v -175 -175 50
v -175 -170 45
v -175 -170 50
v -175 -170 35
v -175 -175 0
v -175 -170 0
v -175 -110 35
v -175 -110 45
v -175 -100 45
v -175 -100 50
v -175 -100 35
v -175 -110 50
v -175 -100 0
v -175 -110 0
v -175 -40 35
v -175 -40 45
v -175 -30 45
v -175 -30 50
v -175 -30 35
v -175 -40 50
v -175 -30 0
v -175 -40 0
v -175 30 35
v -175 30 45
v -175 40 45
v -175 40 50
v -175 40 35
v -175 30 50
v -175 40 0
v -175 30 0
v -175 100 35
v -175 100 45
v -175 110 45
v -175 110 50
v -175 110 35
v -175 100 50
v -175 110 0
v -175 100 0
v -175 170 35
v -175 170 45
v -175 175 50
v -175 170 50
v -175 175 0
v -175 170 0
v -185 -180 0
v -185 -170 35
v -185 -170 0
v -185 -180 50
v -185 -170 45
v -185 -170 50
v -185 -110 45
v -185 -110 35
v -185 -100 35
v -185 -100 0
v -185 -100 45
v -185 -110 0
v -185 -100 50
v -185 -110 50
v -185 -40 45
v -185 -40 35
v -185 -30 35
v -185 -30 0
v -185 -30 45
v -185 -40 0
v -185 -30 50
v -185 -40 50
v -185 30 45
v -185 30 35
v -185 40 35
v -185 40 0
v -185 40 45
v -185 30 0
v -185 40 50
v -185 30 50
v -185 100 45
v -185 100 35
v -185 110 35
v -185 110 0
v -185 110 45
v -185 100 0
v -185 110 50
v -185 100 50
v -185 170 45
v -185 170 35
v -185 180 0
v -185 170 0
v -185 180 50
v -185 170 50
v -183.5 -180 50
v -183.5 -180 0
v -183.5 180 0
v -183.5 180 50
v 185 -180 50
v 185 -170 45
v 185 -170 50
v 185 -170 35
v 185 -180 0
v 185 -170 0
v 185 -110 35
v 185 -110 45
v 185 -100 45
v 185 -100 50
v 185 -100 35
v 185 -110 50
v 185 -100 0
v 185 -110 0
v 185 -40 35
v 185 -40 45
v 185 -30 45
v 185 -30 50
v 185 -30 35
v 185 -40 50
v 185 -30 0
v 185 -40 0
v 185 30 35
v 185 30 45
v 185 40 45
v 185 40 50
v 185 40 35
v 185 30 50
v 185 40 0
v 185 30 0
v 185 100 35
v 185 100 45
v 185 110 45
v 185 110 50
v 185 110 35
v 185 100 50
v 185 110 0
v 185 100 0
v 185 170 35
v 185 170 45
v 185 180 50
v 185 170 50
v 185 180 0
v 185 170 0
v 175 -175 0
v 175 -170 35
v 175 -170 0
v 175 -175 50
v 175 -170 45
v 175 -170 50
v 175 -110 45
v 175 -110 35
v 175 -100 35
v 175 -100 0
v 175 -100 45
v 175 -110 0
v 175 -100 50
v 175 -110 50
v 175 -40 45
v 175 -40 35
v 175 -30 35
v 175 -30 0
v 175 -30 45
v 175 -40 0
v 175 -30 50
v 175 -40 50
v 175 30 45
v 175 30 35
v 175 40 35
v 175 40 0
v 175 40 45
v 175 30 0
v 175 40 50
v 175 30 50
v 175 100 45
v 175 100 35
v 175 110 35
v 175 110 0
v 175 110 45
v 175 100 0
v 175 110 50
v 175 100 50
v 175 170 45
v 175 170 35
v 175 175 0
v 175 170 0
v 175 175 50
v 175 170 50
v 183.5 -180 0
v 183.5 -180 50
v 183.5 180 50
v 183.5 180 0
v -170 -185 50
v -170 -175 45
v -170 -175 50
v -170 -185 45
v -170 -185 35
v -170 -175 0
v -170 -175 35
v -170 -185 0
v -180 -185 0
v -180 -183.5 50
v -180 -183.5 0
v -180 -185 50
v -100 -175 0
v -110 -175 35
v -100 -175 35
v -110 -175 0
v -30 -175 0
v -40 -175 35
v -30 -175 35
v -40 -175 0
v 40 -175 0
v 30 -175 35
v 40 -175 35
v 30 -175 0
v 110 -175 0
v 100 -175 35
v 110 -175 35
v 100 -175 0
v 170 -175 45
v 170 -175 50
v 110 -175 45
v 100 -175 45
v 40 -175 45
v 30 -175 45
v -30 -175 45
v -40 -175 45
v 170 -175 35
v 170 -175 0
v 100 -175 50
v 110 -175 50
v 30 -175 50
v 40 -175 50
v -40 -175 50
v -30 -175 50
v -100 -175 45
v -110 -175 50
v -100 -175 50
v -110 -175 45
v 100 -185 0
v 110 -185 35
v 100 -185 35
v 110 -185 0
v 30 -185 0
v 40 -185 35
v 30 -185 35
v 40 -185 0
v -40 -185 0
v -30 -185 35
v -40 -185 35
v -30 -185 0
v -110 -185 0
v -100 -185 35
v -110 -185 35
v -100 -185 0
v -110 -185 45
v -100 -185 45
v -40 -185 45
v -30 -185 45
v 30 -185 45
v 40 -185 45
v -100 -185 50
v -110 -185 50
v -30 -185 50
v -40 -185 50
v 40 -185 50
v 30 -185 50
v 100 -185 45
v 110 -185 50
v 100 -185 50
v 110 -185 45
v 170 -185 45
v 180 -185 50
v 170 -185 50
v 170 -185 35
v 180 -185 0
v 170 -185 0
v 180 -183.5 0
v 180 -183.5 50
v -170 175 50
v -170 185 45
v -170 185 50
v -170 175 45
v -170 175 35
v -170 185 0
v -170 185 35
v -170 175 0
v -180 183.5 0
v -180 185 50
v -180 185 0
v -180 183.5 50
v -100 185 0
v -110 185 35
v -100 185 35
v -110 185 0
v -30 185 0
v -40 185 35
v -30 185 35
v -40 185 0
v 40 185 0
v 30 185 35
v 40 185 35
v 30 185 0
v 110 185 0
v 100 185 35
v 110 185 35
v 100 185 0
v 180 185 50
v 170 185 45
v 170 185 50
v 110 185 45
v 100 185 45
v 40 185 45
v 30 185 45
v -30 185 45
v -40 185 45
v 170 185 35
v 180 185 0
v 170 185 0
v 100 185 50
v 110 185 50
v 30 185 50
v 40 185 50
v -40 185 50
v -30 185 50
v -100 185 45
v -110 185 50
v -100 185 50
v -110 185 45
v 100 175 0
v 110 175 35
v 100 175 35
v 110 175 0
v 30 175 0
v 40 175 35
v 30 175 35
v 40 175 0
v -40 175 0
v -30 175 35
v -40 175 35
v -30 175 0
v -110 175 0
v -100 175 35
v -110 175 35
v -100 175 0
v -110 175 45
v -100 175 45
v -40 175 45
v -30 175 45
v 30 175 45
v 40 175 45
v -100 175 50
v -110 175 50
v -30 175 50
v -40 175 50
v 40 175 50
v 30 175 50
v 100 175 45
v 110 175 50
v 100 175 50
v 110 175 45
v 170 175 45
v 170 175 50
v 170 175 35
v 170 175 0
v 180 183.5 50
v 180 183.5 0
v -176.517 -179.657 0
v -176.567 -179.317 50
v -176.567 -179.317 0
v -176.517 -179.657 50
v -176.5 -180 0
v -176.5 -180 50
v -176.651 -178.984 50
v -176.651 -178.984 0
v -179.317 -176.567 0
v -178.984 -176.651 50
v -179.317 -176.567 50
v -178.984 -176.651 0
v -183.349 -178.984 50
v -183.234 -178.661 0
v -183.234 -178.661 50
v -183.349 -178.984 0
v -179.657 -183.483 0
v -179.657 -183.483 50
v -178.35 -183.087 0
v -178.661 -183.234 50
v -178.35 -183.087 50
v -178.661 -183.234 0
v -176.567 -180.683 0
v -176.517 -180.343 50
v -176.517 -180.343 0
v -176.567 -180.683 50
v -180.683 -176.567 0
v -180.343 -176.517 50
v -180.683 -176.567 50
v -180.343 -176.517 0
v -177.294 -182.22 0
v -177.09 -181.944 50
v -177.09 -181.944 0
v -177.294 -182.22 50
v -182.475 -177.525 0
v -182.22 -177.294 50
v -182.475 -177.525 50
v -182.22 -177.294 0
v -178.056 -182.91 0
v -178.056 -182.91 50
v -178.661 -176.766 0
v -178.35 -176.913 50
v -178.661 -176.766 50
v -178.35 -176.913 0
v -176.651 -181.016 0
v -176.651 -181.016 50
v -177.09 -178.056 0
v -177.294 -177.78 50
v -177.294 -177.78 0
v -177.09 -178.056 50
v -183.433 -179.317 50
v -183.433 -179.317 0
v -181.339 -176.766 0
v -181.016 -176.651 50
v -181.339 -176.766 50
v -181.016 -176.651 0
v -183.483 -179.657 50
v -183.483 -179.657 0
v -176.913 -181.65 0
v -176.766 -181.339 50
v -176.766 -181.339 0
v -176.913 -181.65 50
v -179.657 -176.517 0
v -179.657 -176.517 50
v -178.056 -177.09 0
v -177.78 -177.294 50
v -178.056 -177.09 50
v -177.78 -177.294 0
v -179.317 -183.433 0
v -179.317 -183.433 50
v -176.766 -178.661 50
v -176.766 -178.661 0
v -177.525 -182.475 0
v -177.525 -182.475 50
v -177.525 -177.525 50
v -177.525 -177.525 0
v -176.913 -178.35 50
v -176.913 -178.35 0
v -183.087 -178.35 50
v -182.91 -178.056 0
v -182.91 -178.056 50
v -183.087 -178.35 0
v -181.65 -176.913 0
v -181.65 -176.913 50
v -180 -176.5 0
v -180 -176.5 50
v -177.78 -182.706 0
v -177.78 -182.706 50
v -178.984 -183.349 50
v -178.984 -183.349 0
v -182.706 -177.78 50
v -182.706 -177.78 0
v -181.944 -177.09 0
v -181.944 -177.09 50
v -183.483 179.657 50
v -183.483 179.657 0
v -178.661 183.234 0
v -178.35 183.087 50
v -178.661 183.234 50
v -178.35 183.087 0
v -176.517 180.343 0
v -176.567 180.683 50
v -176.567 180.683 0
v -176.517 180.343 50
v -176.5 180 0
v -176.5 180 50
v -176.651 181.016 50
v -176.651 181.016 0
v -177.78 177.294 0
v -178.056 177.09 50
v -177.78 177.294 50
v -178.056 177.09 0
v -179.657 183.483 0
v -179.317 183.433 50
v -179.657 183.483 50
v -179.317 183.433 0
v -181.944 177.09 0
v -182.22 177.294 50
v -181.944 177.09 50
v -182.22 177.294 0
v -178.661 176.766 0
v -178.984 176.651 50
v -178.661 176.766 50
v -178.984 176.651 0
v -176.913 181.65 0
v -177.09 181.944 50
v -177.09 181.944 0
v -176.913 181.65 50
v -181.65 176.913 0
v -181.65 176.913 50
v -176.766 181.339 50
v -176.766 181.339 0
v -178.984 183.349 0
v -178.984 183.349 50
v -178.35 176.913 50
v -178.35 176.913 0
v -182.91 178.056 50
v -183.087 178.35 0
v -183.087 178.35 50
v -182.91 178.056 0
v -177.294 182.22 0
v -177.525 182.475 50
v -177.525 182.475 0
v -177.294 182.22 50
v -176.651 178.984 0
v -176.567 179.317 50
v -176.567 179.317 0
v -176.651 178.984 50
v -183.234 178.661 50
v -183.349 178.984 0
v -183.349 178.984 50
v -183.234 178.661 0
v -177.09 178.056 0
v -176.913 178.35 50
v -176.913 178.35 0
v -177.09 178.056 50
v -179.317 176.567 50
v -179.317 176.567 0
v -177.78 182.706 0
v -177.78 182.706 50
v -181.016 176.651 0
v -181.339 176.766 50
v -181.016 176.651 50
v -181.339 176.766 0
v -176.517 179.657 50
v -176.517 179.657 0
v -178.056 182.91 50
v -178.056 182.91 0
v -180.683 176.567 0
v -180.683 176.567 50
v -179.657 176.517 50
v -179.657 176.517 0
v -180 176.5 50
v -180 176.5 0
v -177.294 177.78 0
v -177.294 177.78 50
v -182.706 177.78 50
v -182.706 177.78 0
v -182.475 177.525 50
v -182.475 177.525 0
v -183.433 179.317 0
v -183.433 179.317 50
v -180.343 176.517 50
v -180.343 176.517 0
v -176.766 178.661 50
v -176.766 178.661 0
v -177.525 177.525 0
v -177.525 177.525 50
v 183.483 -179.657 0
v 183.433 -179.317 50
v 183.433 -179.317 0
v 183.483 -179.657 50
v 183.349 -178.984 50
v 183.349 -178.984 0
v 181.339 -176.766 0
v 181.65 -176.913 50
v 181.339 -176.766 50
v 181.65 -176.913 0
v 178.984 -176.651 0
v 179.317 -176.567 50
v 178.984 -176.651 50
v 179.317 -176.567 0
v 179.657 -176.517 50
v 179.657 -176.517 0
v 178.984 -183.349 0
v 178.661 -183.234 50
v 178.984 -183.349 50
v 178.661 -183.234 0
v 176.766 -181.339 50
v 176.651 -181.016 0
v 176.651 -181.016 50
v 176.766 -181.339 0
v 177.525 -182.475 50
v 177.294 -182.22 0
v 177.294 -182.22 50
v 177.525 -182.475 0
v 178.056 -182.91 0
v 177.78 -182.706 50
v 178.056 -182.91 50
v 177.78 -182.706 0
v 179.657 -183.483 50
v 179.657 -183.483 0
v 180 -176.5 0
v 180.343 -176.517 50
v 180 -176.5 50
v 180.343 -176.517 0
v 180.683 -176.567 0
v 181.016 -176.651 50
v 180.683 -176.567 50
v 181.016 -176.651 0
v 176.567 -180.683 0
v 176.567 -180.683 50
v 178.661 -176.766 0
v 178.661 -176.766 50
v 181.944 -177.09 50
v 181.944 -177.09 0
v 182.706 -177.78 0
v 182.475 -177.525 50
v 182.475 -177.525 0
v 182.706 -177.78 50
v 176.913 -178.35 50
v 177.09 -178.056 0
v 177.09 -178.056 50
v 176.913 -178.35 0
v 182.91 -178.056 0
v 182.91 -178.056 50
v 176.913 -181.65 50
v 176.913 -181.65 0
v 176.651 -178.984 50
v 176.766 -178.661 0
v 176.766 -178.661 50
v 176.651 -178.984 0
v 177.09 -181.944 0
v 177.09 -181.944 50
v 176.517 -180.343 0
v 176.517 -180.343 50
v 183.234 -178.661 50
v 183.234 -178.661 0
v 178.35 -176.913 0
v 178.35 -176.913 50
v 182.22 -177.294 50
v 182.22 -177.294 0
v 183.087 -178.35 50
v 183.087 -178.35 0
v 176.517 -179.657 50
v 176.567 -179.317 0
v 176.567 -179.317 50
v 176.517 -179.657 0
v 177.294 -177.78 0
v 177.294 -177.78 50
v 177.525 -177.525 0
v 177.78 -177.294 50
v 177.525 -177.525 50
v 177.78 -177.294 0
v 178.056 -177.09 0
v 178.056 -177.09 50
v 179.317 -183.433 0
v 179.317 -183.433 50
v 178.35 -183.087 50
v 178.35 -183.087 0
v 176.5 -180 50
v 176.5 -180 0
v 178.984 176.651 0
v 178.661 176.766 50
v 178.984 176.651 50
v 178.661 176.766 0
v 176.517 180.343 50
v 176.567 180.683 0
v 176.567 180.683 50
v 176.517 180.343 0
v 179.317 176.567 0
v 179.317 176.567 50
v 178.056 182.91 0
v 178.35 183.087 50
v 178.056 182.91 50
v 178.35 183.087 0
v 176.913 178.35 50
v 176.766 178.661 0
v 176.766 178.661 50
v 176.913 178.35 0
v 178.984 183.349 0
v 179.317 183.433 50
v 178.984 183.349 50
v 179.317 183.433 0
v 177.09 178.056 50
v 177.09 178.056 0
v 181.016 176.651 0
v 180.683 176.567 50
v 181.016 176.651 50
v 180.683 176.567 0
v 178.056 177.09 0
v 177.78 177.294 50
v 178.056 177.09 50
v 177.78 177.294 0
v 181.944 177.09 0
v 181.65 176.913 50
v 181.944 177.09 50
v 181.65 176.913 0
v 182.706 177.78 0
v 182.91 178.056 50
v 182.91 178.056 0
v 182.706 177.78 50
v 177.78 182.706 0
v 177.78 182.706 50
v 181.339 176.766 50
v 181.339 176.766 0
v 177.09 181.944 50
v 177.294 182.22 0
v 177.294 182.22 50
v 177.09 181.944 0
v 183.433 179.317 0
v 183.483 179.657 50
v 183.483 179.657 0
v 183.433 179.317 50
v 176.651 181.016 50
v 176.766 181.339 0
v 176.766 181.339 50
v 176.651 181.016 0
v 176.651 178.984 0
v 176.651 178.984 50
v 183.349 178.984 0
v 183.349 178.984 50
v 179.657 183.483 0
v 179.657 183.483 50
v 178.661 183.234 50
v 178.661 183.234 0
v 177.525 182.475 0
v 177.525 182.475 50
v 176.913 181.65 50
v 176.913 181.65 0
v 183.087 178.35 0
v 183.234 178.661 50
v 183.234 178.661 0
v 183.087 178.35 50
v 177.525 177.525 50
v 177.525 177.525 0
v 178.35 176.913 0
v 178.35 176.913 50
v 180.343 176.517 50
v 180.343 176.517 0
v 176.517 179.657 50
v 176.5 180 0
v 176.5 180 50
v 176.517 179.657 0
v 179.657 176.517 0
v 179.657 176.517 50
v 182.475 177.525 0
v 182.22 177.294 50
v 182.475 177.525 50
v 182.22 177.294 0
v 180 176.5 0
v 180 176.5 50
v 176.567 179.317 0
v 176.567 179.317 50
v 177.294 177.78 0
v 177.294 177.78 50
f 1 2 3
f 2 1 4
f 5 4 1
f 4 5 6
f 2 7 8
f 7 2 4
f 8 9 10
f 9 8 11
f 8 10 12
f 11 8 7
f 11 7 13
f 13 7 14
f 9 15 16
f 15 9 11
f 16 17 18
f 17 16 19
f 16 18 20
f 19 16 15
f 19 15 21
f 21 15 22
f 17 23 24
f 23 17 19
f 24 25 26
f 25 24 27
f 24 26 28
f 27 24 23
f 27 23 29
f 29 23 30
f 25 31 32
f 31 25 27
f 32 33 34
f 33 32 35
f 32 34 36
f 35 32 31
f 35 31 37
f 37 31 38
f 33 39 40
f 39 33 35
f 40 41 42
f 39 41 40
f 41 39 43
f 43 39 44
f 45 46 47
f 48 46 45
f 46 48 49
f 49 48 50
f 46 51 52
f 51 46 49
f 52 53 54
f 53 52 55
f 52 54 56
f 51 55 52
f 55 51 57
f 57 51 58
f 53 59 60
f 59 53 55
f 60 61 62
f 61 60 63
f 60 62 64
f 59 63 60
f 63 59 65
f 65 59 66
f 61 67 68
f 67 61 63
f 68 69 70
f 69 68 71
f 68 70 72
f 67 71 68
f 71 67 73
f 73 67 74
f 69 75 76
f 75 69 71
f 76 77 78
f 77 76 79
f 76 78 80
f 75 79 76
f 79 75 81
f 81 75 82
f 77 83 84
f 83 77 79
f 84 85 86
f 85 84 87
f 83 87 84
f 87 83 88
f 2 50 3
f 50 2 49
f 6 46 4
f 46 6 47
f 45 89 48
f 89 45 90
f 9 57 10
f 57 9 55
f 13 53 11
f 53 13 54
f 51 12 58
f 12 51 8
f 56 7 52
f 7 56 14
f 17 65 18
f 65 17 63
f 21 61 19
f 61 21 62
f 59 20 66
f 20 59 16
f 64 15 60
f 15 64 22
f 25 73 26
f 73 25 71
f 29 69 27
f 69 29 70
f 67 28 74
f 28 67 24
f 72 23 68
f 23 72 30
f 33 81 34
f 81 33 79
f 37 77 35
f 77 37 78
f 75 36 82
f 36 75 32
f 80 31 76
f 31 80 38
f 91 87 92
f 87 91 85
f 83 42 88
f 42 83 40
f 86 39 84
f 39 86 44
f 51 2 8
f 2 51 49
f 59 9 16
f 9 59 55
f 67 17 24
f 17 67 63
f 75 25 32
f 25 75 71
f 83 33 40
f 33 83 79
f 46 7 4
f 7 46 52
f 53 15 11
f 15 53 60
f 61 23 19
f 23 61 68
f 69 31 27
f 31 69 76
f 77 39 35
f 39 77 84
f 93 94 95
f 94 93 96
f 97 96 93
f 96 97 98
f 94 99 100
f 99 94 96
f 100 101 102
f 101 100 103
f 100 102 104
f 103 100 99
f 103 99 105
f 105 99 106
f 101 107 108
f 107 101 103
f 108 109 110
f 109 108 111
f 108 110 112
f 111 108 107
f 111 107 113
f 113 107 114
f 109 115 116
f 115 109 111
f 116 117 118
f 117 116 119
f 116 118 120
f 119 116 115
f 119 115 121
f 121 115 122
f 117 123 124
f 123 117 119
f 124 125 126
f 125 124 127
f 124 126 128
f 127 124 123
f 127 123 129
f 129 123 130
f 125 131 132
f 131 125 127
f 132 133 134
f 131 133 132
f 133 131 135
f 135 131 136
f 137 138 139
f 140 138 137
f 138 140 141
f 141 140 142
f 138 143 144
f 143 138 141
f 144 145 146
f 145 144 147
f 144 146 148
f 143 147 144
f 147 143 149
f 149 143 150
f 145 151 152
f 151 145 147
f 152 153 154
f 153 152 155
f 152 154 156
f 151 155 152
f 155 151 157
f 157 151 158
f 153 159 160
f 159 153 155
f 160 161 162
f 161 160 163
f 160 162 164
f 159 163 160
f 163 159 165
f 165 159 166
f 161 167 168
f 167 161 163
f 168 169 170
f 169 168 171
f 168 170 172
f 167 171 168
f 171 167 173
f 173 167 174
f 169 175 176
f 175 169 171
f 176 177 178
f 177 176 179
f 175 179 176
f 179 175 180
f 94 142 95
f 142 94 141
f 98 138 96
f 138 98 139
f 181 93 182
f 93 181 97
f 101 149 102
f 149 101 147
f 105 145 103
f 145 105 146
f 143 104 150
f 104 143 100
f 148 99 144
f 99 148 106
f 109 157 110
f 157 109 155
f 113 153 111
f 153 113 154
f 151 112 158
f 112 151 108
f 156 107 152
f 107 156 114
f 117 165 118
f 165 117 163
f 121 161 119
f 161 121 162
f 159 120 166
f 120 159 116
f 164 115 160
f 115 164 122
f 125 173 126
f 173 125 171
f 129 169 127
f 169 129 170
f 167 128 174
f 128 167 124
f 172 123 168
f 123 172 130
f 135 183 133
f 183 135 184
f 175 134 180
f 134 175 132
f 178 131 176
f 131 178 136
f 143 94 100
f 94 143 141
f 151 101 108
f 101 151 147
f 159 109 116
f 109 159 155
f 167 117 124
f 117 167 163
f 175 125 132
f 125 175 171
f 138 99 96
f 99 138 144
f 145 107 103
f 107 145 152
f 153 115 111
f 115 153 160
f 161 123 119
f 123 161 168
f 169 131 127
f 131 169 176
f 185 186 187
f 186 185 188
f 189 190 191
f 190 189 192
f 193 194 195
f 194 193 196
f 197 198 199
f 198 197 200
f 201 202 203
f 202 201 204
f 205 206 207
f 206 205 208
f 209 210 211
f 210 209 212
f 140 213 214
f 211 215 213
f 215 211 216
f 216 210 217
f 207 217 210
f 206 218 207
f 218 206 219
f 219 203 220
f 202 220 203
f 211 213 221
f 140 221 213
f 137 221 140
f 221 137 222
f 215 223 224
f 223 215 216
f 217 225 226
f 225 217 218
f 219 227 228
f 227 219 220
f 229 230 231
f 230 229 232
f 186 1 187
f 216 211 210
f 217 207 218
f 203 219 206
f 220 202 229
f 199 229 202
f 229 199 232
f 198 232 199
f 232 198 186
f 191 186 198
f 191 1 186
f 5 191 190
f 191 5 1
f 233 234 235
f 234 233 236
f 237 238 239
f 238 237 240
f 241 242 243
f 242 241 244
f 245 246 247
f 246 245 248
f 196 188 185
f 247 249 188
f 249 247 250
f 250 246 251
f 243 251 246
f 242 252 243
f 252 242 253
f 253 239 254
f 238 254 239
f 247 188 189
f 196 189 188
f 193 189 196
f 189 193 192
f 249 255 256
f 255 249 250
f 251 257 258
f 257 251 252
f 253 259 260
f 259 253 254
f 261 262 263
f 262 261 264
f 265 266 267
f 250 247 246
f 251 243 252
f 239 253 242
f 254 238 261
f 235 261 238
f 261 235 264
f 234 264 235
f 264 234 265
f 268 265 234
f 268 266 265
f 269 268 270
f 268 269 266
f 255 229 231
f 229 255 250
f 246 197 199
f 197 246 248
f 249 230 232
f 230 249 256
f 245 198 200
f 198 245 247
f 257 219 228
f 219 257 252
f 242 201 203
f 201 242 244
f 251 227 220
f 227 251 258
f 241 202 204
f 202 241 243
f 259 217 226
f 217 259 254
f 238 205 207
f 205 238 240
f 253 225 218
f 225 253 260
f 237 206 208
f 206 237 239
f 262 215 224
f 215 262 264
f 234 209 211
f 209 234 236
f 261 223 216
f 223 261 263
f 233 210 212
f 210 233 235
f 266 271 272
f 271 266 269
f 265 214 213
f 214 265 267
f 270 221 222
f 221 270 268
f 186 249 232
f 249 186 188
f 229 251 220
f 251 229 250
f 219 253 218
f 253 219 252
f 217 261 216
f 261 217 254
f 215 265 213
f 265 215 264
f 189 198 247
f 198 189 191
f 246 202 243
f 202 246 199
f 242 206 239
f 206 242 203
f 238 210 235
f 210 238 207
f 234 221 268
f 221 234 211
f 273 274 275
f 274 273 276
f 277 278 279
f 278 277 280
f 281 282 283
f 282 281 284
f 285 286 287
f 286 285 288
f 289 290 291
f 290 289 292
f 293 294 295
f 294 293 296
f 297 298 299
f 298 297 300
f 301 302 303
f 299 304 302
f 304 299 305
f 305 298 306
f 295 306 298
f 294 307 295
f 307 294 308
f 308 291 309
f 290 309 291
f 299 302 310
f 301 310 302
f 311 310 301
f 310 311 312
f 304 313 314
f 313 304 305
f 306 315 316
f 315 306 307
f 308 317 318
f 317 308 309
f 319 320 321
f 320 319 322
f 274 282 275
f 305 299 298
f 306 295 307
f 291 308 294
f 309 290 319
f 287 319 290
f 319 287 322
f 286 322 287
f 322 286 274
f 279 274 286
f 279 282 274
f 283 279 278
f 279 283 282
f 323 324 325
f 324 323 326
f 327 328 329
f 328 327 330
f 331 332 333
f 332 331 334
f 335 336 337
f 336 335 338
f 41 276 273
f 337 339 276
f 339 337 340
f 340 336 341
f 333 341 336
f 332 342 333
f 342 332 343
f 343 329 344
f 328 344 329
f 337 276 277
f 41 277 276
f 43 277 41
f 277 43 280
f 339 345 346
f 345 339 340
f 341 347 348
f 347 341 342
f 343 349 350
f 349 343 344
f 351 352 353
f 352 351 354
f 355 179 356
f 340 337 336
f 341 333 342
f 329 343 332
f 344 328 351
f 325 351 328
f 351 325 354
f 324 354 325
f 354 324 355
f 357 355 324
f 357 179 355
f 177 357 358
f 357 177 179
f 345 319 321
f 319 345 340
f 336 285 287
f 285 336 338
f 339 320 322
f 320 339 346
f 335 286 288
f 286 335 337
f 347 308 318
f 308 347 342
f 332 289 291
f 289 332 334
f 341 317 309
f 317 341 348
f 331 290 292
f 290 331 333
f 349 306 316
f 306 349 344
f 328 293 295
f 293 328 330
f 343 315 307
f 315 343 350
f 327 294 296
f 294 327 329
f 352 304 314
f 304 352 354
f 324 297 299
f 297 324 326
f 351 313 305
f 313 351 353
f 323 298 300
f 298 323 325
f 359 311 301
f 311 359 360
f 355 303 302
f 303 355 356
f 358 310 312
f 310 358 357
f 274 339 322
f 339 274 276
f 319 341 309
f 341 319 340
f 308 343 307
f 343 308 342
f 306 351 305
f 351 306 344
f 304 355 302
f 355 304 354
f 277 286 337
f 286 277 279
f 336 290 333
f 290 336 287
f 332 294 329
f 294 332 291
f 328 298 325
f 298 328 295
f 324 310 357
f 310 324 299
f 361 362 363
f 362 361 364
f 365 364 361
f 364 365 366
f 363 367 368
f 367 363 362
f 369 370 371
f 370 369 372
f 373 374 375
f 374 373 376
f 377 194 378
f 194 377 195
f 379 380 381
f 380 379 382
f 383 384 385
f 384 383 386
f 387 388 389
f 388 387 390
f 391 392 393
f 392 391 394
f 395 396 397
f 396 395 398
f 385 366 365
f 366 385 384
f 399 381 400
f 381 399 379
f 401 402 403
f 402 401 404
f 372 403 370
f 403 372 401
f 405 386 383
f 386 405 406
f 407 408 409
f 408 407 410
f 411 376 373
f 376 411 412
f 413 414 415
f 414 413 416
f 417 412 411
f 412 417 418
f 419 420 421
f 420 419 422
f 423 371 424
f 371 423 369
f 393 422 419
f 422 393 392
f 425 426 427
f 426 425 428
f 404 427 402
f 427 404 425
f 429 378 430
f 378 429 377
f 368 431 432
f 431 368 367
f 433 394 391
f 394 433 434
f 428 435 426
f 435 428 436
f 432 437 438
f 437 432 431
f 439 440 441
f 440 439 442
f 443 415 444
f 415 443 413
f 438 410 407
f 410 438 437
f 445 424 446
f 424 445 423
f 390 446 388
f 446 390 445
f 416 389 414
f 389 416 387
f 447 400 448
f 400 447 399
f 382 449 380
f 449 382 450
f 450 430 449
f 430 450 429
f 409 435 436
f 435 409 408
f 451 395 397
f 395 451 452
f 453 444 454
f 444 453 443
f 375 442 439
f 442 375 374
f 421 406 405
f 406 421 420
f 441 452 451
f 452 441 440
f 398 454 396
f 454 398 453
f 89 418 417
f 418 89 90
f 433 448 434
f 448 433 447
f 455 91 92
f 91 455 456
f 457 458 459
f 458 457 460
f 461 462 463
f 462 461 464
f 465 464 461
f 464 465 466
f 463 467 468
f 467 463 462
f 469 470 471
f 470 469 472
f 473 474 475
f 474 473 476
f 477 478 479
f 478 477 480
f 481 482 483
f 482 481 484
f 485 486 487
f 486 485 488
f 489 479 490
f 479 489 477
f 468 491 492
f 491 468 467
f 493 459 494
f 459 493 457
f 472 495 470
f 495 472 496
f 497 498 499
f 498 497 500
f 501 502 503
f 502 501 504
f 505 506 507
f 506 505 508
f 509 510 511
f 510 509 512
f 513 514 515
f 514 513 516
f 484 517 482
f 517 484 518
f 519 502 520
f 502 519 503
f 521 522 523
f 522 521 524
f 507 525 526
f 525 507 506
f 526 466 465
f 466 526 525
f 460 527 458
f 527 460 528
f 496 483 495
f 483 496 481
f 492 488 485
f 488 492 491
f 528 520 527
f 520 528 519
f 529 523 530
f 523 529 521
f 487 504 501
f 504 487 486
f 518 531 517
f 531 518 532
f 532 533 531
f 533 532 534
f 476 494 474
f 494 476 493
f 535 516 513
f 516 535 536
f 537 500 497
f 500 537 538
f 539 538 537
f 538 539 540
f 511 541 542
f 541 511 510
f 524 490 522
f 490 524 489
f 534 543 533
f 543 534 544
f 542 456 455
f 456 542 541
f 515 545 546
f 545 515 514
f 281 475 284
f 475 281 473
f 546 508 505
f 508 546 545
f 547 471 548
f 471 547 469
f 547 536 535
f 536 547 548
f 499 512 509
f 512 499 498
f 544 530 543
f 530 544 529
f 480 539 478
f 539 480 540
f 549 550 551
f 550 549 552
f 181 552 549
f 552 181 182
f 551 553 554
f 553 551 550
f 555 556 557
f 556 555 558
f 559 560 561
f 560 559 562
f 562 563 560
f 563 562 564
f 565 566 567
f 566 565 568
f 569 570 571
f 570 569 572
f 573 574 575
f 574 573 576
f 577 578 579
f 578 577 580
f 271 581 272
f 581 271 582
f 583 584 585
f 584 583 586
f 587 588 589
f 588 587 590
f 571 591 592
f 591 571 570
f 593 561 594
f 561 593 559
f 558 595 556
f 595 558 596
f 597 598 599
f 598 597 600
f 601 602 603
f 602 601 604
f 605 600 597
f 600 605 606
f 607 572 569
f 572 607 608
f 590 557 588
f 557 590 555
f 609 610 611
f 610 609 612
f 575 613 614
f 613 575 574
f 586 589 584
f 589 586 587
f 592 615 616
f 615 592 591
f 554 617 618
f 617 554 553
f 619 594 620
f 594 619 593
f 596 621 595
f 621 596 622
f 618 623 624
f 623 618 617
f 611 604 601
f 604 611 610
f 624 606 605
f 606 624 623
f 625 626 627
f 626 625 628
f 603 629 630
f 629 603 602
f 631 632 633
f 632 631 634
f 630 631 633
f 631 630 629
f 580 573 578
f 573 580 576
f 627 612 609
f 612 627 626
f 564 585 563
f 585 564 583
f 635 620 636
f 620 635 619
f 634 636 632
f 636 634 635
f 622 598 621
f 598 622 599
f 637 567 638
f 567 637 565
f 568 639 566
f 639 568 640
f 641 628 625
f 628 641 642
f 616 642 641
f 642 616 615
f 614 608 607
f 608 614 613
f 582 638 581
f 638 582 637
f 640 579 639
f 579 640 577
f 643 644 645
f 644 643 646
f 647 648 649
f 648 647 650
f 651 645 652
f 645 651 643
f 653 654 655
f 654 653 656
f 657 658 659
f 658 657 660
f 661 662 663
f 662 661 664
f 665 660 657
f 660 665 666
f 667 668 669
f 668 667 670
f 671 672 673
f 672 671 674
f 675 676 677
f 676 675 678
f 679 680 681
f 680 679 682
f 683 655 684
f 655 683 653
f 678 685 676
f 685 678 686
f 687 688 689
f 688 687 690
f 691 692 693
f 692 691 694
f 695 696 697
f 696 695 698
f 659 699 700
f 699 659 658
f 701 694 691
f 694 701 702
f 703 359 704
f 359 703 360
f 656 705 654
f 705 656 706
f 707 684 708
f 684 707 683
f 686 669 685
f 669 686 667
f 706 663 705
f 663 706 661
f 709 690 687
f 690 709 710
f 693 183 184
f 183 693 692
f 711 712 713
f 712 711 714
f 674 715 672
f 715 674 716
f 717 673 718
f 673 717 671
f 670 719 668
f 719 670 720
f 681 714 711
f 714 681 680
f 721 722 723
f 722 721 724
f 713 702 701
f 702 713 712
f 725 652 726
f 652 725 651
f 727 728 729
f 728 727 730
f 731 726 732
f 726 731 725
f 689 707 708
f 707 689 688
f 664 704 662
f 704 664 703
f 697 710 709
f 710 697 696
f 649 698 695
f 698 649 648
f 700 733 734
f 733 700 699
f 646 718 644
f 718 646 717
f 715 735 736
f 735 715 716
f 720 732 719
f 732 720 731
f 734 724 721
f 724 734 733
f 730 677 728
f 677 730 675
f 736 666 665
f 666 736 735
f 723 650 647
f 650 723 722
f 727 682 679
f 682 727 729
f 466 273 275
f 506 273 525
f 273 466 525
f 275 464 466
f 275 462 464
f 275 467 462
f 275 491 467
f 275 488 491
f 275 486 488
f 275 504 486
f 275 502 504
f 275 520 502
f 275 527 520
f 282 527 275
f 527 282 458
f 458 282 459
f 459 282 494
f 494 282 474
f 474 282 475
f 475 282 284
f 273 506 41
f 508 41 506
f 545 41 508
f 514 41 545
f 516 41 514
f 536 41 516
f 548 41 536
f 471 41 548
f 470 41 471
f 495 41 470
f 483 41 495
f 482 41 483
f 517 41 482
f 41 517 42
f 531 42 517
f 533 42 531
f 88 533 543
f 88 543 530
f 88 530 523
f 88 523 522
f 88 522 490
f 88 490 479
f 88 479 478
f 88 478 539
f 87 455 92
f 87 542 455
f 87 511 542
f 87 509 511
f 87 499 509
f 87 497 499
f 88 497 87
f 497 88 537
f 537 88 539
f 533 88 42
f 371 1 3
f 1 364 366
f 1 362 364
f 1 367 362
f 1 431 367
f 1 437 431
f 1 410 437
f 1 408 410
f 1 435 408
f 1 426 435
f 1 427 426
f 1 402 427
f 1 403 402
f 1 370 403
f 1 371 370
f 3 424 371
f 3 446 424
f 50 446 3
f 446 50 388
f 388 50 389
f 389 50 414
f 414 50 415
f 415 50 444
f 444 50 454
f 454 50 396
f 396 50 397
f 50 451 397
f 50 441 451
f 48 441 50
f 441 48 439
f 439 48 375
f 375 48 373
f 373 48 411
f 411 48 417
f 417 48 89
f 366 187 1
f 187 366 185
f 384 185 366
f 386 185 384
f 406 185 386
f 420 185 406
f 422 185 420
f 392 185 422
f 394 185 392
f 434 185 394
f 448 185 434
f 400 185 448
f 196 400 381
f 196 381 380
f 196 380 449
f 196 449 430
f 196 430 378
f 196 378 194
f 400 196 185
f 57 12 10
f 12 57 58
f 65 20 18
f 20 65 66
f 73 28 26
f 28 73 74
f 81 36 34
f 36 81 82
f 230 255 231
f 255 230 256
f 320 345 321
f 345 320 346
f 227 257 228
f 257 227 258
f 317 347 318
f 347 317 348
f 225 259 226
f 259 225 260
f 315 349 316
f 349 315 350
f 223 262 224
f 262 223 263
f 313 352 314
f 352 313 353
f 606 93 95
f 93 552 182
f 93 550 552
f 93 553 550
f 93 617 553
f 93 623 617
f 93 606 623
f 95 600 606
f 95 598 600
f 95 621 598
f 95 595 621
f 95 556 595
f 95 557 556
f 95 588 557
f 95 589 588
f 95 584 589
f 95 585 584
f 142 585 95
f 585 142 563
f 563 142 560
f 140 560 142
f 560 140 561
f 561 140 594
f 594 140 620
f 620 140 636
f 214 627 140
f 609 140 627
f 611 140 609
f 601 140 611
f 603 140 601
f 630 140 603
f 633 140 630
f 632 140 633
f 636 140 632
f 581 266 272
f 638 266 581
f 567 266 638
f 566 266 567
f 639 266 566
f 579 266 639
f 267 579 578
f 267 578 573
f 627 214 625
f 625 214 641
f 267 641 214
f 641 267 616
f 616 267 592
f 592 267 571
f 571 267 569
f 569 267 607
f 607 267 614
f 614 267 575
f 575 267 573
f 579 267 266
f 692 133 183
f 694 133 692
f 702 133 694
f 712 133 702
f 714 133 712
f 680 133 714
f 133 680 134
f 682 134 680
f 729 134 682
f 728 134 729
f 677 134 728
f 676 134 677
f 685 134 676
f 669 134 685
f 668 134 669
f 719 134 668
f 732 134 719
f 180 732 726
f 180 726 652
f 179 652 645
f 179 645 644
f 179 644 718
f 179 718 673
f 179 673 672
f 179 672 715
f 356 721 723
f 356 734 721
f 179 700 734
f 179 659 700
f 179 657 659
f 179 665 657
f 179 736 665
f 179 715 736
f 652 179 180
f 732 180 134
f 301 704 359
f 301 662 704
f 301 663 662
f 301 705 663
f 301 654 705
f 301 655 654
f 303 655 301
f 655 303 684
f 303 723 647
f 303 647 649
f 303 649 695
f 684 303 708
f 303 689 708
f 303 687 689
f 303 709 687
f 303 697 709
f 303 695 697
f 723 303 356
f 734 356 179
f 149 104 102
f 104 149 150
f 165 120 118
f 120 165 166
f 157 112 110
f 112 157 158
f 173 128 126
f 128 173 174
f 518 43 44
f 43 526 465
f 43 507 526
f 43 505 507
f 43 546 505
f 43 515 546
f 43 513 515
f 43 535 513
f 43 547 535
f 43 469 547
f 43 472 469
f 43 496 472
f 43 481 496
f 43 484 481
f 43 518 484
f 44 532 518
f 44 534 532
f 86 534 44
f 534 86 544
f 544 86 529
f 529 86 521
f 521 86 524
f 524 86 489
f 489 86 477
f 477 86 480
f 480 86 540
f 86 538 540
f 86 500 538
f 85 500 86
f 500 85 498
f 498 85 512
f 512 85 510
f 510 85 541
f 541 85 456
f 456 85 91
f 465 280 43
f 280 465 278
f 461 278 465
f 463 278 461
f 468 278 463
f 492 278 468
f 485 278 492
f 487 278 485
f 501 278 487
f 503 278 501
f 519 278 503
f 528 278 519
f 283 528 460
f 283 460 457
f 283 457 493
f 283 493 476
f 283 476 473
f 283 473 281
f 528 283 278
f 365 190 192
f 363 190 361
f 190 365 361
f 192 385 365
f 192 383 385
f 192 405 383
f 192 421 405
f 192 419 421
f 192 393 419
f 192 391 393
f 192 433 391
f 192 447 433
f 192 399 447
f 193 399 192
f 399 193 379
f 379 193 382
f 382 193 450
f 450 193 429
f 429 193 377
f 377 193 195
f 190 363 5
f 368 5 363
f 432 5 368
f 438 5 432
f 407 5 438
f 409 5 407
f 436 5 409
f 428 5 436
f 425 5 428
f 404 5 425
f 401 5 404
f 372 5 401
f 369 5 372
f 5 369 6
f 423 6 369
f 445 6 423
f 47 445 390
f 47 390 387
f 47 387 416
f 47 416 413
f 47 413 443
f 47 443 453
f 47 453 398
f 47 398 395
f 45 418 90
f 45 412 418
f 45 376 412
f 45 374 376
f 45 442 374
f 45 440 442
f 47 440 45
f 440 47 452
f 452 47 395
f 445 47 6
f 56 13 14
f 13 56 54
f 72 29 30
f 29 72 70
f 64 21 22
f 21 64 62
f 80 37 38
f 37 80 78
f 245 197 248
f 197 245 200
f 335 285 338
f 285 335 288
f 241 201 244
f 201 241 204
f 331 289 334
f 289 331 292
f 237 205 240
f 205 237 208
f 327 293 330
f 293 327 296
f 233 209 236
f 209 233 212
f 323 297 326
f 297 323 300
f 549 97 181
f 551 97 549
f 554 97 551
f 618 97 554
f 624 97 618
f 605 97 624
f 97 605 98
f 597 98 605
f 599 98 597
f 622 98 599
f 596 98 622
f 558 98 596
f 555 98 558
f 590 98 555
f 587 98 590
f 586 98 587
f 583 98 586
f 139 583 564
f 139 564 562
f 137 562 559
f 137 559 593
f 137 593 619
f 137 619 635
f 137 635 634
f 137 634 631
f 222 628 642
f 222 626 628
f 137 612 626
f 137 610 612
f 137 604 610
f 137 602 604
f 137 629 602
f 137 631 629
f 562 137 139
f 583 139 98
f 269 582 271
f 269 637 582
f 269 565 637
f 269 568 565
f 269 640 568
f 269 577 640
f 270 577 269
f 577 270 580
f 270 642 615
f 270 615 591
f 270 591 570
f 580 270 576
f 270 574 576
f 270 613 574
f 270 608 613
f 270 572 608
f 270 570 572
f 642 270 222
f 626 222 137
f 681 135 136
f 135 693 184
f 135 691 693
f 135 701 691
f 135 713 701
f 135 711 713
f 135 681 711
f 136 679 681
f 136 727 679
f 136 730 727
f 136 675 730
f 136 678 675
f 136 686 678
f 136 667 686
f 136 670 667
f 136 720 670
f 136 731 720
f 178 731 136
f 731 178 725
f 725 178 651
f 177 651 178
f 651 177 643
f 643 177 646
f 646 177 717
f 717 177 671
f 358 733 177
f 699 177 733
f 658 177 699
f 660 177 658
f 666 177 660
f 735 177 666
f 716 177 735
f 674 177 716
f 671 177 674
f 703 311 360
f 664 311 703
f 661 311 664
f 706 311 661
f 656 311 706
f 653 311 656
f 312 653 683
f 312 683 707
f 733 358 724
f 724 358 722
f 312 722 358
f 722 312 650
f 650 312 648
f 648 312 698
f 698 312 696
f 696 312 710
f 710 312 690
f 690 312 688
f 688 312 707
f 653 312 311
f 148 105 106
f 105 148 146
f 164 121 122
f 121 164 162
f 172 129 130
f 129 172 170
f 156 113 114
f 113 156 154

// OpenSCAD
/*
  Cage slice 06 of 15
*/

bar = 10;
half_inner = 175;
gap = 70;
rod_d = 7;
half_outer = half_inner + bar;

function grid_pos(n) = -half_inner + n * gap;

module cage_full() {
  difference() {
    union() {
      // Floor grid at z = -10 .. 0
      for (j = [0:5]) {
        y = grid_pos(j);
        translate([-half_inner, y - bar/2, -bar])
          cube([2*half_inner, bar, bar], center=false);
      }
      for (i = [0:5]) {
        x = grid_pos(i);
        translate([x - bar/2, -half_inner, -bar])
          cube([bar, 2*half_inner, bar], center=false);
      }

      // Roof grid at z = 700 .. 710
      for (j = [0:5]) {
        y = grid_pos(j);
        translate([-half_inner, y - bar/2, 700])
          cube([2*half_inner, bar, bar], center=false);
      }
      for (i = [0:5]) {
        x = grid_pos(i);
        translate([x - bar/2, -half_inner, 700])
          cube([bar, 2*half_inner, bar], center=false);
      }

      // Side walls at x = ±175
      for (side = [-1, 1]) {
        sx = side * half_inner;
        x0 = (side == 1) ? sx : sx - bar;
        for (j = [0:5]) {
          y = grid_pos(j);
          translate([x0, y - bar/2, 0])
            cube([bar, bar, 700], center=false);
        }
        for (k = [0:10]) {
          zc = 0 + k * gap;
          translate([x0, -half_inner, zc - bar/2])
            cube([bar, 2*half_inner, bar], center=false);
        }
      }

      // Front/back walls at y = ±175
      for (side = [-1, 1]) {
        sy = side * half_inner;
        y0 = (side == 1) ? sy : sy - bar;
        for (i = [0:5]) {
          x = grid_pos(i);
          translate([x - bar/2, y0, 0])
            cube([bar, bar, 700], center=false);
        }
        for (k = [0:10]) {
          zc = 0 + k * gap;
          translate([-half_inner, y0, zc - bar/2])
            cube([2*half_inner, bar, bar], center=false);
        }
      }
    }

    for (sx = [-1, 1], sy = [-1, 1]) {
      translate([sx * (half_inner + bar/2),
                 sy * (half_inner + bar/2),
                 -20])
        cylinder(d = rod_d, h = 740, $fn = 64);
    }
  }
}

z_min = 240;
z_max = 290;  // height 50 mm

module slice() {
  intersection() {
    cage_full();
    translate([-half_outer - 5, -half_outer - 5, z_min])
      cube([2*(half_outer + 5), 2*(half_outer + 5), z_max - z_min], center=false);
  }
}

translate([0, 0, -z_min])
  slice();
